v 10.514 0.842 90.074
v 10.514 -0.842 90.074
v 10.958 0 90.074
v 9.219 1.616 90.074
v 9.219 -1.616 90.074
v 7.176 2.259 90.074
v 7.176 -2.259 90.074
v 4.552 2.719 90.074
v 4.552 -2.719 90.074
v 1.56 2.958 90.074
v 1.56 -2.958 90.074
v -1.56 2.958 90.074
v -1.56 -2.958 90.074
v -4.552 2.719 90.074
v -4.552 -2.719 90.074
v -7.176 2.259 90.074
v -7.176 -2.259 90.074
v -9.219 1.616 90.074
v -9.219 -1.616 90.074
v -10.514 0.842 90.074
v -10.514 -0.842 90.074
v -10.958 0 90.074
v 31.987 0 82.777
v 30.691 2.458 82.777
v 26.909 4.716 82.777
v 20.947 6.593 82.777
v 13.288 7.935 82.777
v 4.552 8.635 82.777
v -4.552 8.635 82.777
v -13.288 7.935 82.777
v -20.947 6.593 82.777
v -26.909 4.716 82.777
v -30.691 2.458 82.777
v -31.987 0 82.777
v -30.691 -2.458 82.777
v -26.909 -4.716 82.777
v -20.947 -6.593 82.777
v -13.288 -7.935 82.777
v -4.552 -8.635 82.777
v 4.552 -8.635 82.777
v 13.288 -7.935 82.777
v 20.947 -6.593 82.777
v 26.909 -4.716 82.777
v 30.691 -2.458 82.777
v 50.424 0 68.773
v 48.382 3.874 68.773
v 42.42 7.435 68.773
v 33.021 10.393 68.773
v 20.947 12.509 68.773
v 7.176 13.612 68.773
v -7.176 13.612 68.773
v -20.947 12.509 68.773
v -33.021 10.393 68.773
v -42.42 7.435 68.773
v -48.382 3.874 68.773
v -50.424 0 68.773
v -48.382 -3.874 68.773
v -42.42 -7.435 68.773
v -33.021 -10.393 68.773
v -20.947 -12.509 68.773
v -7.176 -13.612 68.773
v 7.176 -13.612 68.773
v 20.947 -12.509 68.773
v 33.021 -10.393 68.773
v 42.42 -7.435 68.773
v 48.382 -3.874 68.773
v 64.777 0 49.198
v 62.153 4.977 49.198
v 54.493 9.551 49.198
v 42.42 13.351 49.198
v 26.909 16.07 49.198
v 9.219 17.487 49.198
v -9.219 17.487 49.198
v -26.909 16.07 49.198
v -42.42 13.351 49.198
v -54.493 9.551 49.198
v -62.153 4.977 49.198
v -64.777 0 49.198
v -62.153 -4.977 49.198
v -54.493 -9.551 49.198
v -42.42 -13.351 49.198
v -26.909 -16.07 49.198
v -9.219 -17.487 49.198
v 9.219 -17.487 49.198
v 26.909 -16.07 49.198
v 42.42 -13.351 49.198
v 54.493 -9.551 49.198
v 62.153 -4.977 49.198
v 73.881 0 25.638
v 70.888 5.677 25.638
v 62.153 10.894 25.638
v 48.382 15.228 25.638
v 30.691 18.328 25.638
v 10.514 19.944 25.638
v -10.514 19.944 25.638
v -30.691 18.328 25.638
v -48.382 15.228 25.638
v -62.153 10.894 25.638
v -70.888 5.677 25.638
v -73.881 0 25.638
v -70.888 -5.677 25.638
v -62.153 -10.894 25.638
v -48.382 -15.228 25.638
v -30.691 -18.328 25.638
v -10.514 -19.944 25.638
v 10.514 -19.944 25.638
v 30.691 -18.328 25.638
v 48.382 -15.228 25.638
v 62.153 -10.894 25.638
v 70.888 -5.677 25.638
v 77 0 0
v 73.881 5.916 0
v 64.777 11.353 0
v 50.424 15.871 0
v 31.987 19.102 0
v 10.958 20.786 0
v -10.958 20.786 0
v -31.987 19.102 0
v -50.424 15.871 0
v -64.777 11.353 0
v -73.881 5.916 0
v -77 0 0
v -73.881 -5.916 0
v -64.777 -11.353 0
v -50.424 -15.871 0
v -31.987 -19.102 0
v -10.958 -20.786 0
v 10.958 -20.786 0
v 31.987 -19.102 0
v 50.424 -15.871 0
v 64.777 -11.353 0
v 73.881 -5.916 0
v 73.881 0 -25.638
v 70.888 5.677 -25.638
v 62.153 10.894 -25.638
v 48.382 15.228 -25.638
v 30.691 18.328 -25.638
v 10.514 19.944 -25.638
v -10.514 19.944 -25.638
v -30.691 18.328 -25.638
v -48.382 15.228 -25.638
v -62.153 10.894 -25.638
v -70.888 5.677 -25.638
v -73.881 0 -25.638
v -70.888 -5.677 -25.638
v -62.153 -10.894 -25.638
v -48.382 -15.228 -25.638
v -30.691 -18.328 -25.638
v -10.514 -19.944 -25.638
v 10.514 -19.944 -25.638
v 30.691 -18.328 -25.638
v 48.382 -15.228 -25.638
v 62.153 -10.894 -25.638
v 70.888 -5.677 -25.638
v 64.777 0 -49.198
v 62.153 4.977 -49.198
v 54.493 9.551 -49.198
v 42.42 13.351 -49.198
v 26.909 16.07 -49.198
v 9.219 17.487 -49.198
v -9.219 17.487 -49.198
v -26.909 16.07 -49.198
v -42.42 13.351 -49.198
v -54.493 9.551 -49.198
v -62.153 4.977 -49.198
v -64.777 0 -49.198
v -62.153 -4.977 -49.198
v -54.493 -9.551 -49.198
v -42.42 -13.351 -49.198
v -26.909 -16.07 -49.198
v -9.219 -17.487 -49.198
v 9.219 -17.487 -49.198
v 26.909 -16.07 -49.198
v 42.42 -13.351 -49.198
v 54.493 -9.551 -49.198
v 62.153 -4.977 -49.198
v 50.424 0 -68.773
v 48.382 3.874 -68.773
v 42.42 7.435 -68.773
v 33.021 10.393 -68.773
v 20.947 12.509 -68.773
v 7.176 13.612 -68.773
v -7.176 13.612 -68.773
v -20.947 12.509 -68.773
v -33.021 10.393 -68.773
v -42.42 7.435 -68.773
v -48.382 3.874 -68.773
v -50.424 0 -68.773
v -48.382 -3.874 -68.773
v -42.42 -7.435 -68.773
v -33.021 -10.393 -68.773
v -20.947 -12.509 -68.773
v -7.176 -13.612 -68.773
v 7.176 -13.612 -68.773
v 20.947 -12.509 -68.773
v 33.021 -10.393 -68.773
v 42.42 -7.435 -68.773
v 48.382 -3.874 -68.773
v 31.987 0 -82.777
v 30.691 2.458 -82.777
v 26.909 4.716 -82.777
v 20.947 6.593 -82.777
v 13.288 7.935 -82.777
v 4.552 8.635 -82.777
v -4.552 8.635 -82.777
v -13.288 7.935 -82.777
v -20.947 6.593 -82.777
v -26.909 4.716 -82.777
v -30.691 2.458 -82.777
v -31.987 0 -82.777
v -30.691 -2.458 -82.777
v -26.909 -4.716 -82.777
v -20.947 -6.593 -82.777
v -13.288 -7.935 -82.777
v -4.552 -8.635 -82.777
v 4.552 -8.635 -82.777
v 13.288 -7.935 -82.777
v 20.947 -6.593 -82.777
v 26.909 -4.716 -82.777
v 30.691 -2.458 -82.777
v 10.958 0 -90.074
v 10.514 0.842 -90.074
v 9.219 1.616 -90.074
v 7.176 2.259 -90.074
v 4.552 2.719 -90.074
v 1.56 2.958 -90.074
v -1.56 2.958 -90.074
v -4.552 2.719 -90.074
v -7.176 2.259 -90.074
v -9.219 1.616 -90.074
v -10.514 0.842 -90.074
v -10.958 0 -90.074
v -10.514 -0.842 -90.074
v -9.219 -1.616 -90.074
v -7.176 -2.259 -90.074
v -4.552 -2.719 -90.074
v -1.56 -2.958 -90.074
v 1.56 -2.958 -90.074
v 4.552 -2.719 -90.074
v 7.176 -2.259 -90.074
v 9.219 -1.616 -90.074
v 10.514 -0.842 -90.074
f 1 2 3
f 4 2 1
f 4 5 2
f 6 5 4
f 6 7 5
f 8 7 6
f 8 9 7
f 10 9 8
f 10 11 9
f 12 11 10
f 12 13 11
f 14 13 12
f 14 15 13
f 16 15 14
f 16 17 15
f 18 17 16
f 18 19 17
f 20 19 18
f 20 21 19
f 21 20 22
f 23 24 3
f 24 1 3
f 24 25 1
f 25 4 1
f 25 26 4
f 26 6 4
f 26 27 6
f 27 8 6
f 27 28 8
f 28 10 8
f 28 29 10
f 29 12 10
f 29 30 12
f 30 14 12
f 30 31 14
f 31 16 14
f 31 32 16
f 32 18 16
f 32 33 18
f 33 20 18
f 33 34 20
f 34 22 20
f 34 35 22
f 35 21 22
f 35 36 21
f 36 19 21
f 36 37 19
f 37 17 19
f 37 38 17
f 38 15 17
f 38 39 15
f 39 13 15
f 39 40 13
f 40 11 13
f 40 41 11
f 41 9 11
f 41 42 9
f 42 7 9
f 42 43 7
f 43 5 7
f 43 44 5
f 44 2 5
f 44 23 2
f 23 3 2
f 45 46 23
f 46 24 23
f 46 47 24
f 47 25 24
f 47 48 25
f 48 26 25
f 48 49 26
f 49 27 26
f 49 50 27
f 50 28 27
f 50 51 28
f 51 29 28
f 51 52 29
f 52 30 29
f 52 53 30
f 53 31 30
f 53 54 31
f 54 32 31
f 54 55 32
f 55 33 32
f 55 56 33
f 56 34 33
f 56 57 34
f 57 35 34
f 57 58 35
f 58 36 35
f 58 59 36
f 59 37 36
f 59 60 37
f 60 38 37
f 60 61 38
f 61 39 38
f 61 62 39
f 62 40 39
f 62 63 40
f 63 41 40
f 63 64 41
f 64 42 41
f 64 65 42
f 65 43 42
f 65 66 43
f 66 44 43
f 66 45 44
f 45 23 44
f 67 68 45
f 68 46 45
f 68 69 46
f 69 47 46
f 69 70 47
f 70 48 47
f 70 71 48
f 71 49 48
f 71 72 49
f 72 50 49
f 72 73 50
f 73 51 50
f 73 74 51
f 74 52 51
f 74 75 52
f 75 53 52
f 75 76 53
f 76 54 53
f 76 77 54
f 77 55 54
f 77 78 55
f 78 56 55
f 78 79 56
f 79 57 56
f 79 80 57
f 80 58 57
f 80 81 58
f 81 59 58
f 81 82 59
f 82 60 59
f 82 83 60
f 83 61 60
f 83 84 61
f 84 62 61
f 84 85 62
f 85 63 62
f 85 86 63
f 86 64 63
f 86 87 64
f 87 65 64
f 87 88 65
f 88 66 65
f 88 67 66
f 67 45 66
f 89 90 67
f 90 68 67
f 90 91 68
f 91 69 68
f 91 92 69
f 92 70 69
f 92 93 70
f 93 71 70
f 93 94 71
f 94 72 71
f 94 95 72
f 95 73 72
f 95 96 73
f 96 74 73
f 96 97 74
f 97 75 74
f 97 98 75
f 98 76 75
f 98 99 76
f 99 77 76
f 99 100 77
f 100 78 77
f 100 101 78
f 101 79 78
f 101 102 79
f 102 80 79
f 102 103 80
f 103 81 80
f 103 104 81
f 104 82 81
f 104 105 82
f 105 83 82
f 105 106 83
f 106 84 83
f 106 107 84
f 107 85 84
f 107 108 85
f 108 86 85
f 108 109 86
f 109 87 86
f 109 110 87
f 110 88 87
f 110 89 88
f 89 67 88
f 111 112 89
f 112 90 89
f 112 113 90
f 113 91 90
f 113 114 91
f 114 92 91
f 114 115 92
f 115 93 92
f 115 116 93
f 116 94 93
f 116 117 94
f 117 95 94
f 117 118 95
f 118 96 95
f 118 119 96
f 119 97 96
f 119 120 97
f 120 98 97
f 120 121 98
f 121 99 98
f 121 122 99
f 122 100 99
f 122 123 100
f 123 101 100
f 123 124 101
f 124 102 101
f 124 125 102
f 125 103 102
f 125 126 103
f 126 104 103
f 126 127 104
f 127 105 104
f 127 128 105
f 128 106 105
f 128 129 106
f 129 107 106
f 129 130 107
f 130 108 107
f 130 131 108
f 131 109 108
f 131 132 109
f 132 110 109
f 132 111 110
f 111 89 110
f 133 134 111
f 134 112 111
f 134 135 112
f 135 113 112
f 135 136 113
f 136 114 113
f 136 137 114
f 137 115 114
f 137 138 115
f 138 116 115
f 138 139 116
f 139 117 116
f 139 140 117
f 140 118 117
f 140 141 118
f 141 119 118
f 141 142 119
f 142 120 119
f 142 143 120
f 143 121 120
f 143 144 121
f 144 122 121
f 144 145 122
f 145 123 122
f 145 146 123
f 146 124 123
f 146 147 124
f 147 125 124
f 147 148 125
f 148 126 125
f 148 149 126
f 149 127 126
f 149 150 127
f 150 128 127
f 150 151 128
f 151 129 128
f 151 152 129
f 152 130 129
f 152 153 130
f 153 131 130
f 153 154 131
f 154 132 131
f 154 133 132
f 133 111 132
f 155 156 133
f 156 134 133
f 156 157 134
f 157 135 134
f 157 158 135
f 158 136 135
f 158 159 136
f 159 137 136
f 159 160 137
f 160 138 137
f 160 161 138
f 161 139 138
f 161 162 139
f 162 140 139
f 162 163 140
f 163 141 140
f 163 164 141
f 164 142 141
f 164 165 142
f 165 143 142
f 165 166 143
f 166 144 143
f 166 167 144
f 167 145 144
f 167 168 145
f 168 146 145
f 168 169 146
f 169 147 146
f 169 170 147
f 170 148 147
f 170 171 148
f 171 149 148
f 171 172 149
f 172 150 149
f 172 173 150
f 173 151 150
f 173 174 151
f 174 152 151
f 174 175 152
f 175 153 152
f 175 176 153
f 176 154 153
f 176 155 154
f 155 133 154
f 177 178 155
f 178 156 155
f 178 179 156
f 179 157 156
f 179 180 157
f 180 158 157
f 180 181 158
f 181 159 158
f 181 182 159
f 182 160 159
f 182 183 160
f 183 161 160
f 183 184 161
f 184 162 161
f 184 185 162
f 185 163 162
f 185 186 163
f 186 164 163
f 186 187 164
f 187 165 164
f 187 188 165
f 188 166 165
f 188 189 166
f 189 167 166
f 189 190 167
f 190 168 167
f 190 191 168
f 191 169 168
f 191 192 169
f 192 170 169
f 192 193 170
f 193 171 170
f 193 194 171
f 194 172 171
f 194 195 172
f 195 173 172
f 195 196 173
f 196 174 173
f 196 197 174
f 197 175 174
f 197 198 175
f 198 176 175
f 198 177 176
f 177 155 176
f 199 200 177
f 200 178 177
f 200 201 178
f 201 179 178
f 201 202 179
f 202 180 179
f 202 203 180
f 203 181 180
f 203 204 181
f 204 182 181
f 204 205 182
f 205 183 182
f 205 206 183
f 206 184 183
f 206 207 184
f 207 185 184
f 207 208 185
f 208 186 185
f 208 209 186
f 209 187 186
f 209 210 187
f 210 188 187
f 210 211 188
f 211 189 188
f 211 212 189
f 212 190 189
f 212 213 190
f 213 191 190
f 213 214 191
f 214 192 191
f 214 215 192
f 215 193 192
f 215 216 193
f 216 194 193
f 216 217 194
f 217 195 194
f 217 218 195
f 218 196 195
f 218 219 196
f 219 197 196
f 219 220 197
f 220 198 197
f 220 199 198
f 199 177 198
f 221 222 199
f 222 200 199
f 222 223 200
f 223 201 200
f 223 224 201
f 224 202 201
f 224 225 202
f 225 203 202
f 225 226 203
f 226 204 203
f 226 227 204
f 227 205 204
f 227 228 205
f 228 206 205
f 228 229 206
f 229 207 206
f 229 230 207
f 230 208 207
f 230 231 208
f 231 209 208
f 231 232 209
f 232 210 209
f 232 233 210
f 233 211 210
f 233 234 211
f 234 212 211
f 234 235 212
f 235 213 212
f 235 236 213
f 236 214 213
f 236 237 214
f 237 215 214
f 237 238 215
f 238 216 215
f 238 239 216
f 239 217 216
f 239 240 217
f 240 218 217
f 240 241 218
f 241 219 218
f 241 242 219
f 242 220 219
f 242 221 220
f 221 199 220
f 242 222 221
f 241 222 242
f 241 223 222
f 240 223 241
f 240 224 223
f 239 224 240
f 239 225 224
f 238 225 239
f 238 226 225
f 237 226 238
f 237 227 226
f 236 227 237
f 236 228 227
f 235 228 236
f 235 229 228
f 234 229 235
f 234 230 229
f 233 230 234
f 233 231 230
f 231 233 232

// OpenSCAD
// Generated by SolidPython 1.0.1 on 2020-07-29 00:46:49


scale(v = [11, 3, 13]) {
	sphere(r = 7);
}
/***********************************************
*********      SolidPython code:      **********
************************************************
 
# import packages: SolidPython
from solid import *
from solid.utils import *
from itertools import chain, combinations, permutations


class Resize:

    def __init__(self, scad_file):
        self.scad_file = scad_file
        #self.scad_file = import_scad(scad_file)
        # cone/cylinder param:
        self.r1 = 0
        self.r2 = 0
        self.h = 0
        # rectangular prism param:
        self.w = 0
        self.l = 0
        # ellipse param:
        self.r = 0

    # import OpenScad code (file name corresponds to shape)


    # classify shape + parameters
    def assign(self, param1, param2, param3):
        if self.scad_file == 'cone.scad':
            self.r1 = param1
            self.r2 = param2
            self.h = param3
        elif self.scad_file == 'cylinder.scad':
            self.r1 = param1
            self.r2 = param2
            self.h = param3
        elif self.scad_file == 'rectangularPrism.scad':
            self.h = param1
            self.l = param2
            self.w = param3
        else:
            self.r = param1
            self.h = param2

    # resize parameters
    def iterate(self):
        x = range(3, 20, 2)
        i = 1
        if self.scad_file == 'cone.scad':
            tempList = list(permutations(x, 2))
            for temp in tempList:
                param1 = temp[0]
                param2 = temp[1]
                filepath = 'produced_scad_files/' + 'cone' + str(param1) + '_' + str(param2) + '_' + '.scad'
                scad_render_to_file(cylinder(h=param1, r1=param2, r2=0), filepath)

        elif self.scad_file == 'cylinder.scad':
            tempList = list(permutations(x, 3))
            for temp in tempList:
                param1 = temp[0]
                param2 = temp[1]
                filepath = 'produced_scad_files/' + 'cylinder' + str(param1) + '_' + str(param2) + '_' + '.scad'
                scad_render_to_file(cylinder(h=param1, r1=param2, r2=param2), filepath)

        elif self.scad_file == 'rectangularPrism.scad':
            tempList = list(permutations(x, 3))
            for temp in tempList:
                param1 = temp[0]
                param2 = temp[1]
                param3 = temp[2]
                filepath = 'produced_scad_files/' + 'rectangularPrism' + str(param1) + '_' + str(param2) + '_' + str(
                    param3) + '.scad'
                scad_render_to_file(cube(size=(param1, param2, param3)), filepath)

        elif self.scad_file == 'ellipse.scad':
            tempList = list(permutations(x, 4))
            for temp in tempList:
                param1 = temp[0]
                param2 = temp[1]
                param3 = temp[2]
                param4 = temp[3]
                filepath = 'produced_scad_files/' + 'ellipse' + str(param1) + '_' + str(param2) + '_' + str(param3) + '_' + str(param4) + '.scad'
                scad_render_to_file(scale([param1, param2, param3])(sphere(r=param4)), filepath)

    def render_to_scadfile(self):
        scad_render_to_file(scad, 'example.scad') 
 
************************************************/
